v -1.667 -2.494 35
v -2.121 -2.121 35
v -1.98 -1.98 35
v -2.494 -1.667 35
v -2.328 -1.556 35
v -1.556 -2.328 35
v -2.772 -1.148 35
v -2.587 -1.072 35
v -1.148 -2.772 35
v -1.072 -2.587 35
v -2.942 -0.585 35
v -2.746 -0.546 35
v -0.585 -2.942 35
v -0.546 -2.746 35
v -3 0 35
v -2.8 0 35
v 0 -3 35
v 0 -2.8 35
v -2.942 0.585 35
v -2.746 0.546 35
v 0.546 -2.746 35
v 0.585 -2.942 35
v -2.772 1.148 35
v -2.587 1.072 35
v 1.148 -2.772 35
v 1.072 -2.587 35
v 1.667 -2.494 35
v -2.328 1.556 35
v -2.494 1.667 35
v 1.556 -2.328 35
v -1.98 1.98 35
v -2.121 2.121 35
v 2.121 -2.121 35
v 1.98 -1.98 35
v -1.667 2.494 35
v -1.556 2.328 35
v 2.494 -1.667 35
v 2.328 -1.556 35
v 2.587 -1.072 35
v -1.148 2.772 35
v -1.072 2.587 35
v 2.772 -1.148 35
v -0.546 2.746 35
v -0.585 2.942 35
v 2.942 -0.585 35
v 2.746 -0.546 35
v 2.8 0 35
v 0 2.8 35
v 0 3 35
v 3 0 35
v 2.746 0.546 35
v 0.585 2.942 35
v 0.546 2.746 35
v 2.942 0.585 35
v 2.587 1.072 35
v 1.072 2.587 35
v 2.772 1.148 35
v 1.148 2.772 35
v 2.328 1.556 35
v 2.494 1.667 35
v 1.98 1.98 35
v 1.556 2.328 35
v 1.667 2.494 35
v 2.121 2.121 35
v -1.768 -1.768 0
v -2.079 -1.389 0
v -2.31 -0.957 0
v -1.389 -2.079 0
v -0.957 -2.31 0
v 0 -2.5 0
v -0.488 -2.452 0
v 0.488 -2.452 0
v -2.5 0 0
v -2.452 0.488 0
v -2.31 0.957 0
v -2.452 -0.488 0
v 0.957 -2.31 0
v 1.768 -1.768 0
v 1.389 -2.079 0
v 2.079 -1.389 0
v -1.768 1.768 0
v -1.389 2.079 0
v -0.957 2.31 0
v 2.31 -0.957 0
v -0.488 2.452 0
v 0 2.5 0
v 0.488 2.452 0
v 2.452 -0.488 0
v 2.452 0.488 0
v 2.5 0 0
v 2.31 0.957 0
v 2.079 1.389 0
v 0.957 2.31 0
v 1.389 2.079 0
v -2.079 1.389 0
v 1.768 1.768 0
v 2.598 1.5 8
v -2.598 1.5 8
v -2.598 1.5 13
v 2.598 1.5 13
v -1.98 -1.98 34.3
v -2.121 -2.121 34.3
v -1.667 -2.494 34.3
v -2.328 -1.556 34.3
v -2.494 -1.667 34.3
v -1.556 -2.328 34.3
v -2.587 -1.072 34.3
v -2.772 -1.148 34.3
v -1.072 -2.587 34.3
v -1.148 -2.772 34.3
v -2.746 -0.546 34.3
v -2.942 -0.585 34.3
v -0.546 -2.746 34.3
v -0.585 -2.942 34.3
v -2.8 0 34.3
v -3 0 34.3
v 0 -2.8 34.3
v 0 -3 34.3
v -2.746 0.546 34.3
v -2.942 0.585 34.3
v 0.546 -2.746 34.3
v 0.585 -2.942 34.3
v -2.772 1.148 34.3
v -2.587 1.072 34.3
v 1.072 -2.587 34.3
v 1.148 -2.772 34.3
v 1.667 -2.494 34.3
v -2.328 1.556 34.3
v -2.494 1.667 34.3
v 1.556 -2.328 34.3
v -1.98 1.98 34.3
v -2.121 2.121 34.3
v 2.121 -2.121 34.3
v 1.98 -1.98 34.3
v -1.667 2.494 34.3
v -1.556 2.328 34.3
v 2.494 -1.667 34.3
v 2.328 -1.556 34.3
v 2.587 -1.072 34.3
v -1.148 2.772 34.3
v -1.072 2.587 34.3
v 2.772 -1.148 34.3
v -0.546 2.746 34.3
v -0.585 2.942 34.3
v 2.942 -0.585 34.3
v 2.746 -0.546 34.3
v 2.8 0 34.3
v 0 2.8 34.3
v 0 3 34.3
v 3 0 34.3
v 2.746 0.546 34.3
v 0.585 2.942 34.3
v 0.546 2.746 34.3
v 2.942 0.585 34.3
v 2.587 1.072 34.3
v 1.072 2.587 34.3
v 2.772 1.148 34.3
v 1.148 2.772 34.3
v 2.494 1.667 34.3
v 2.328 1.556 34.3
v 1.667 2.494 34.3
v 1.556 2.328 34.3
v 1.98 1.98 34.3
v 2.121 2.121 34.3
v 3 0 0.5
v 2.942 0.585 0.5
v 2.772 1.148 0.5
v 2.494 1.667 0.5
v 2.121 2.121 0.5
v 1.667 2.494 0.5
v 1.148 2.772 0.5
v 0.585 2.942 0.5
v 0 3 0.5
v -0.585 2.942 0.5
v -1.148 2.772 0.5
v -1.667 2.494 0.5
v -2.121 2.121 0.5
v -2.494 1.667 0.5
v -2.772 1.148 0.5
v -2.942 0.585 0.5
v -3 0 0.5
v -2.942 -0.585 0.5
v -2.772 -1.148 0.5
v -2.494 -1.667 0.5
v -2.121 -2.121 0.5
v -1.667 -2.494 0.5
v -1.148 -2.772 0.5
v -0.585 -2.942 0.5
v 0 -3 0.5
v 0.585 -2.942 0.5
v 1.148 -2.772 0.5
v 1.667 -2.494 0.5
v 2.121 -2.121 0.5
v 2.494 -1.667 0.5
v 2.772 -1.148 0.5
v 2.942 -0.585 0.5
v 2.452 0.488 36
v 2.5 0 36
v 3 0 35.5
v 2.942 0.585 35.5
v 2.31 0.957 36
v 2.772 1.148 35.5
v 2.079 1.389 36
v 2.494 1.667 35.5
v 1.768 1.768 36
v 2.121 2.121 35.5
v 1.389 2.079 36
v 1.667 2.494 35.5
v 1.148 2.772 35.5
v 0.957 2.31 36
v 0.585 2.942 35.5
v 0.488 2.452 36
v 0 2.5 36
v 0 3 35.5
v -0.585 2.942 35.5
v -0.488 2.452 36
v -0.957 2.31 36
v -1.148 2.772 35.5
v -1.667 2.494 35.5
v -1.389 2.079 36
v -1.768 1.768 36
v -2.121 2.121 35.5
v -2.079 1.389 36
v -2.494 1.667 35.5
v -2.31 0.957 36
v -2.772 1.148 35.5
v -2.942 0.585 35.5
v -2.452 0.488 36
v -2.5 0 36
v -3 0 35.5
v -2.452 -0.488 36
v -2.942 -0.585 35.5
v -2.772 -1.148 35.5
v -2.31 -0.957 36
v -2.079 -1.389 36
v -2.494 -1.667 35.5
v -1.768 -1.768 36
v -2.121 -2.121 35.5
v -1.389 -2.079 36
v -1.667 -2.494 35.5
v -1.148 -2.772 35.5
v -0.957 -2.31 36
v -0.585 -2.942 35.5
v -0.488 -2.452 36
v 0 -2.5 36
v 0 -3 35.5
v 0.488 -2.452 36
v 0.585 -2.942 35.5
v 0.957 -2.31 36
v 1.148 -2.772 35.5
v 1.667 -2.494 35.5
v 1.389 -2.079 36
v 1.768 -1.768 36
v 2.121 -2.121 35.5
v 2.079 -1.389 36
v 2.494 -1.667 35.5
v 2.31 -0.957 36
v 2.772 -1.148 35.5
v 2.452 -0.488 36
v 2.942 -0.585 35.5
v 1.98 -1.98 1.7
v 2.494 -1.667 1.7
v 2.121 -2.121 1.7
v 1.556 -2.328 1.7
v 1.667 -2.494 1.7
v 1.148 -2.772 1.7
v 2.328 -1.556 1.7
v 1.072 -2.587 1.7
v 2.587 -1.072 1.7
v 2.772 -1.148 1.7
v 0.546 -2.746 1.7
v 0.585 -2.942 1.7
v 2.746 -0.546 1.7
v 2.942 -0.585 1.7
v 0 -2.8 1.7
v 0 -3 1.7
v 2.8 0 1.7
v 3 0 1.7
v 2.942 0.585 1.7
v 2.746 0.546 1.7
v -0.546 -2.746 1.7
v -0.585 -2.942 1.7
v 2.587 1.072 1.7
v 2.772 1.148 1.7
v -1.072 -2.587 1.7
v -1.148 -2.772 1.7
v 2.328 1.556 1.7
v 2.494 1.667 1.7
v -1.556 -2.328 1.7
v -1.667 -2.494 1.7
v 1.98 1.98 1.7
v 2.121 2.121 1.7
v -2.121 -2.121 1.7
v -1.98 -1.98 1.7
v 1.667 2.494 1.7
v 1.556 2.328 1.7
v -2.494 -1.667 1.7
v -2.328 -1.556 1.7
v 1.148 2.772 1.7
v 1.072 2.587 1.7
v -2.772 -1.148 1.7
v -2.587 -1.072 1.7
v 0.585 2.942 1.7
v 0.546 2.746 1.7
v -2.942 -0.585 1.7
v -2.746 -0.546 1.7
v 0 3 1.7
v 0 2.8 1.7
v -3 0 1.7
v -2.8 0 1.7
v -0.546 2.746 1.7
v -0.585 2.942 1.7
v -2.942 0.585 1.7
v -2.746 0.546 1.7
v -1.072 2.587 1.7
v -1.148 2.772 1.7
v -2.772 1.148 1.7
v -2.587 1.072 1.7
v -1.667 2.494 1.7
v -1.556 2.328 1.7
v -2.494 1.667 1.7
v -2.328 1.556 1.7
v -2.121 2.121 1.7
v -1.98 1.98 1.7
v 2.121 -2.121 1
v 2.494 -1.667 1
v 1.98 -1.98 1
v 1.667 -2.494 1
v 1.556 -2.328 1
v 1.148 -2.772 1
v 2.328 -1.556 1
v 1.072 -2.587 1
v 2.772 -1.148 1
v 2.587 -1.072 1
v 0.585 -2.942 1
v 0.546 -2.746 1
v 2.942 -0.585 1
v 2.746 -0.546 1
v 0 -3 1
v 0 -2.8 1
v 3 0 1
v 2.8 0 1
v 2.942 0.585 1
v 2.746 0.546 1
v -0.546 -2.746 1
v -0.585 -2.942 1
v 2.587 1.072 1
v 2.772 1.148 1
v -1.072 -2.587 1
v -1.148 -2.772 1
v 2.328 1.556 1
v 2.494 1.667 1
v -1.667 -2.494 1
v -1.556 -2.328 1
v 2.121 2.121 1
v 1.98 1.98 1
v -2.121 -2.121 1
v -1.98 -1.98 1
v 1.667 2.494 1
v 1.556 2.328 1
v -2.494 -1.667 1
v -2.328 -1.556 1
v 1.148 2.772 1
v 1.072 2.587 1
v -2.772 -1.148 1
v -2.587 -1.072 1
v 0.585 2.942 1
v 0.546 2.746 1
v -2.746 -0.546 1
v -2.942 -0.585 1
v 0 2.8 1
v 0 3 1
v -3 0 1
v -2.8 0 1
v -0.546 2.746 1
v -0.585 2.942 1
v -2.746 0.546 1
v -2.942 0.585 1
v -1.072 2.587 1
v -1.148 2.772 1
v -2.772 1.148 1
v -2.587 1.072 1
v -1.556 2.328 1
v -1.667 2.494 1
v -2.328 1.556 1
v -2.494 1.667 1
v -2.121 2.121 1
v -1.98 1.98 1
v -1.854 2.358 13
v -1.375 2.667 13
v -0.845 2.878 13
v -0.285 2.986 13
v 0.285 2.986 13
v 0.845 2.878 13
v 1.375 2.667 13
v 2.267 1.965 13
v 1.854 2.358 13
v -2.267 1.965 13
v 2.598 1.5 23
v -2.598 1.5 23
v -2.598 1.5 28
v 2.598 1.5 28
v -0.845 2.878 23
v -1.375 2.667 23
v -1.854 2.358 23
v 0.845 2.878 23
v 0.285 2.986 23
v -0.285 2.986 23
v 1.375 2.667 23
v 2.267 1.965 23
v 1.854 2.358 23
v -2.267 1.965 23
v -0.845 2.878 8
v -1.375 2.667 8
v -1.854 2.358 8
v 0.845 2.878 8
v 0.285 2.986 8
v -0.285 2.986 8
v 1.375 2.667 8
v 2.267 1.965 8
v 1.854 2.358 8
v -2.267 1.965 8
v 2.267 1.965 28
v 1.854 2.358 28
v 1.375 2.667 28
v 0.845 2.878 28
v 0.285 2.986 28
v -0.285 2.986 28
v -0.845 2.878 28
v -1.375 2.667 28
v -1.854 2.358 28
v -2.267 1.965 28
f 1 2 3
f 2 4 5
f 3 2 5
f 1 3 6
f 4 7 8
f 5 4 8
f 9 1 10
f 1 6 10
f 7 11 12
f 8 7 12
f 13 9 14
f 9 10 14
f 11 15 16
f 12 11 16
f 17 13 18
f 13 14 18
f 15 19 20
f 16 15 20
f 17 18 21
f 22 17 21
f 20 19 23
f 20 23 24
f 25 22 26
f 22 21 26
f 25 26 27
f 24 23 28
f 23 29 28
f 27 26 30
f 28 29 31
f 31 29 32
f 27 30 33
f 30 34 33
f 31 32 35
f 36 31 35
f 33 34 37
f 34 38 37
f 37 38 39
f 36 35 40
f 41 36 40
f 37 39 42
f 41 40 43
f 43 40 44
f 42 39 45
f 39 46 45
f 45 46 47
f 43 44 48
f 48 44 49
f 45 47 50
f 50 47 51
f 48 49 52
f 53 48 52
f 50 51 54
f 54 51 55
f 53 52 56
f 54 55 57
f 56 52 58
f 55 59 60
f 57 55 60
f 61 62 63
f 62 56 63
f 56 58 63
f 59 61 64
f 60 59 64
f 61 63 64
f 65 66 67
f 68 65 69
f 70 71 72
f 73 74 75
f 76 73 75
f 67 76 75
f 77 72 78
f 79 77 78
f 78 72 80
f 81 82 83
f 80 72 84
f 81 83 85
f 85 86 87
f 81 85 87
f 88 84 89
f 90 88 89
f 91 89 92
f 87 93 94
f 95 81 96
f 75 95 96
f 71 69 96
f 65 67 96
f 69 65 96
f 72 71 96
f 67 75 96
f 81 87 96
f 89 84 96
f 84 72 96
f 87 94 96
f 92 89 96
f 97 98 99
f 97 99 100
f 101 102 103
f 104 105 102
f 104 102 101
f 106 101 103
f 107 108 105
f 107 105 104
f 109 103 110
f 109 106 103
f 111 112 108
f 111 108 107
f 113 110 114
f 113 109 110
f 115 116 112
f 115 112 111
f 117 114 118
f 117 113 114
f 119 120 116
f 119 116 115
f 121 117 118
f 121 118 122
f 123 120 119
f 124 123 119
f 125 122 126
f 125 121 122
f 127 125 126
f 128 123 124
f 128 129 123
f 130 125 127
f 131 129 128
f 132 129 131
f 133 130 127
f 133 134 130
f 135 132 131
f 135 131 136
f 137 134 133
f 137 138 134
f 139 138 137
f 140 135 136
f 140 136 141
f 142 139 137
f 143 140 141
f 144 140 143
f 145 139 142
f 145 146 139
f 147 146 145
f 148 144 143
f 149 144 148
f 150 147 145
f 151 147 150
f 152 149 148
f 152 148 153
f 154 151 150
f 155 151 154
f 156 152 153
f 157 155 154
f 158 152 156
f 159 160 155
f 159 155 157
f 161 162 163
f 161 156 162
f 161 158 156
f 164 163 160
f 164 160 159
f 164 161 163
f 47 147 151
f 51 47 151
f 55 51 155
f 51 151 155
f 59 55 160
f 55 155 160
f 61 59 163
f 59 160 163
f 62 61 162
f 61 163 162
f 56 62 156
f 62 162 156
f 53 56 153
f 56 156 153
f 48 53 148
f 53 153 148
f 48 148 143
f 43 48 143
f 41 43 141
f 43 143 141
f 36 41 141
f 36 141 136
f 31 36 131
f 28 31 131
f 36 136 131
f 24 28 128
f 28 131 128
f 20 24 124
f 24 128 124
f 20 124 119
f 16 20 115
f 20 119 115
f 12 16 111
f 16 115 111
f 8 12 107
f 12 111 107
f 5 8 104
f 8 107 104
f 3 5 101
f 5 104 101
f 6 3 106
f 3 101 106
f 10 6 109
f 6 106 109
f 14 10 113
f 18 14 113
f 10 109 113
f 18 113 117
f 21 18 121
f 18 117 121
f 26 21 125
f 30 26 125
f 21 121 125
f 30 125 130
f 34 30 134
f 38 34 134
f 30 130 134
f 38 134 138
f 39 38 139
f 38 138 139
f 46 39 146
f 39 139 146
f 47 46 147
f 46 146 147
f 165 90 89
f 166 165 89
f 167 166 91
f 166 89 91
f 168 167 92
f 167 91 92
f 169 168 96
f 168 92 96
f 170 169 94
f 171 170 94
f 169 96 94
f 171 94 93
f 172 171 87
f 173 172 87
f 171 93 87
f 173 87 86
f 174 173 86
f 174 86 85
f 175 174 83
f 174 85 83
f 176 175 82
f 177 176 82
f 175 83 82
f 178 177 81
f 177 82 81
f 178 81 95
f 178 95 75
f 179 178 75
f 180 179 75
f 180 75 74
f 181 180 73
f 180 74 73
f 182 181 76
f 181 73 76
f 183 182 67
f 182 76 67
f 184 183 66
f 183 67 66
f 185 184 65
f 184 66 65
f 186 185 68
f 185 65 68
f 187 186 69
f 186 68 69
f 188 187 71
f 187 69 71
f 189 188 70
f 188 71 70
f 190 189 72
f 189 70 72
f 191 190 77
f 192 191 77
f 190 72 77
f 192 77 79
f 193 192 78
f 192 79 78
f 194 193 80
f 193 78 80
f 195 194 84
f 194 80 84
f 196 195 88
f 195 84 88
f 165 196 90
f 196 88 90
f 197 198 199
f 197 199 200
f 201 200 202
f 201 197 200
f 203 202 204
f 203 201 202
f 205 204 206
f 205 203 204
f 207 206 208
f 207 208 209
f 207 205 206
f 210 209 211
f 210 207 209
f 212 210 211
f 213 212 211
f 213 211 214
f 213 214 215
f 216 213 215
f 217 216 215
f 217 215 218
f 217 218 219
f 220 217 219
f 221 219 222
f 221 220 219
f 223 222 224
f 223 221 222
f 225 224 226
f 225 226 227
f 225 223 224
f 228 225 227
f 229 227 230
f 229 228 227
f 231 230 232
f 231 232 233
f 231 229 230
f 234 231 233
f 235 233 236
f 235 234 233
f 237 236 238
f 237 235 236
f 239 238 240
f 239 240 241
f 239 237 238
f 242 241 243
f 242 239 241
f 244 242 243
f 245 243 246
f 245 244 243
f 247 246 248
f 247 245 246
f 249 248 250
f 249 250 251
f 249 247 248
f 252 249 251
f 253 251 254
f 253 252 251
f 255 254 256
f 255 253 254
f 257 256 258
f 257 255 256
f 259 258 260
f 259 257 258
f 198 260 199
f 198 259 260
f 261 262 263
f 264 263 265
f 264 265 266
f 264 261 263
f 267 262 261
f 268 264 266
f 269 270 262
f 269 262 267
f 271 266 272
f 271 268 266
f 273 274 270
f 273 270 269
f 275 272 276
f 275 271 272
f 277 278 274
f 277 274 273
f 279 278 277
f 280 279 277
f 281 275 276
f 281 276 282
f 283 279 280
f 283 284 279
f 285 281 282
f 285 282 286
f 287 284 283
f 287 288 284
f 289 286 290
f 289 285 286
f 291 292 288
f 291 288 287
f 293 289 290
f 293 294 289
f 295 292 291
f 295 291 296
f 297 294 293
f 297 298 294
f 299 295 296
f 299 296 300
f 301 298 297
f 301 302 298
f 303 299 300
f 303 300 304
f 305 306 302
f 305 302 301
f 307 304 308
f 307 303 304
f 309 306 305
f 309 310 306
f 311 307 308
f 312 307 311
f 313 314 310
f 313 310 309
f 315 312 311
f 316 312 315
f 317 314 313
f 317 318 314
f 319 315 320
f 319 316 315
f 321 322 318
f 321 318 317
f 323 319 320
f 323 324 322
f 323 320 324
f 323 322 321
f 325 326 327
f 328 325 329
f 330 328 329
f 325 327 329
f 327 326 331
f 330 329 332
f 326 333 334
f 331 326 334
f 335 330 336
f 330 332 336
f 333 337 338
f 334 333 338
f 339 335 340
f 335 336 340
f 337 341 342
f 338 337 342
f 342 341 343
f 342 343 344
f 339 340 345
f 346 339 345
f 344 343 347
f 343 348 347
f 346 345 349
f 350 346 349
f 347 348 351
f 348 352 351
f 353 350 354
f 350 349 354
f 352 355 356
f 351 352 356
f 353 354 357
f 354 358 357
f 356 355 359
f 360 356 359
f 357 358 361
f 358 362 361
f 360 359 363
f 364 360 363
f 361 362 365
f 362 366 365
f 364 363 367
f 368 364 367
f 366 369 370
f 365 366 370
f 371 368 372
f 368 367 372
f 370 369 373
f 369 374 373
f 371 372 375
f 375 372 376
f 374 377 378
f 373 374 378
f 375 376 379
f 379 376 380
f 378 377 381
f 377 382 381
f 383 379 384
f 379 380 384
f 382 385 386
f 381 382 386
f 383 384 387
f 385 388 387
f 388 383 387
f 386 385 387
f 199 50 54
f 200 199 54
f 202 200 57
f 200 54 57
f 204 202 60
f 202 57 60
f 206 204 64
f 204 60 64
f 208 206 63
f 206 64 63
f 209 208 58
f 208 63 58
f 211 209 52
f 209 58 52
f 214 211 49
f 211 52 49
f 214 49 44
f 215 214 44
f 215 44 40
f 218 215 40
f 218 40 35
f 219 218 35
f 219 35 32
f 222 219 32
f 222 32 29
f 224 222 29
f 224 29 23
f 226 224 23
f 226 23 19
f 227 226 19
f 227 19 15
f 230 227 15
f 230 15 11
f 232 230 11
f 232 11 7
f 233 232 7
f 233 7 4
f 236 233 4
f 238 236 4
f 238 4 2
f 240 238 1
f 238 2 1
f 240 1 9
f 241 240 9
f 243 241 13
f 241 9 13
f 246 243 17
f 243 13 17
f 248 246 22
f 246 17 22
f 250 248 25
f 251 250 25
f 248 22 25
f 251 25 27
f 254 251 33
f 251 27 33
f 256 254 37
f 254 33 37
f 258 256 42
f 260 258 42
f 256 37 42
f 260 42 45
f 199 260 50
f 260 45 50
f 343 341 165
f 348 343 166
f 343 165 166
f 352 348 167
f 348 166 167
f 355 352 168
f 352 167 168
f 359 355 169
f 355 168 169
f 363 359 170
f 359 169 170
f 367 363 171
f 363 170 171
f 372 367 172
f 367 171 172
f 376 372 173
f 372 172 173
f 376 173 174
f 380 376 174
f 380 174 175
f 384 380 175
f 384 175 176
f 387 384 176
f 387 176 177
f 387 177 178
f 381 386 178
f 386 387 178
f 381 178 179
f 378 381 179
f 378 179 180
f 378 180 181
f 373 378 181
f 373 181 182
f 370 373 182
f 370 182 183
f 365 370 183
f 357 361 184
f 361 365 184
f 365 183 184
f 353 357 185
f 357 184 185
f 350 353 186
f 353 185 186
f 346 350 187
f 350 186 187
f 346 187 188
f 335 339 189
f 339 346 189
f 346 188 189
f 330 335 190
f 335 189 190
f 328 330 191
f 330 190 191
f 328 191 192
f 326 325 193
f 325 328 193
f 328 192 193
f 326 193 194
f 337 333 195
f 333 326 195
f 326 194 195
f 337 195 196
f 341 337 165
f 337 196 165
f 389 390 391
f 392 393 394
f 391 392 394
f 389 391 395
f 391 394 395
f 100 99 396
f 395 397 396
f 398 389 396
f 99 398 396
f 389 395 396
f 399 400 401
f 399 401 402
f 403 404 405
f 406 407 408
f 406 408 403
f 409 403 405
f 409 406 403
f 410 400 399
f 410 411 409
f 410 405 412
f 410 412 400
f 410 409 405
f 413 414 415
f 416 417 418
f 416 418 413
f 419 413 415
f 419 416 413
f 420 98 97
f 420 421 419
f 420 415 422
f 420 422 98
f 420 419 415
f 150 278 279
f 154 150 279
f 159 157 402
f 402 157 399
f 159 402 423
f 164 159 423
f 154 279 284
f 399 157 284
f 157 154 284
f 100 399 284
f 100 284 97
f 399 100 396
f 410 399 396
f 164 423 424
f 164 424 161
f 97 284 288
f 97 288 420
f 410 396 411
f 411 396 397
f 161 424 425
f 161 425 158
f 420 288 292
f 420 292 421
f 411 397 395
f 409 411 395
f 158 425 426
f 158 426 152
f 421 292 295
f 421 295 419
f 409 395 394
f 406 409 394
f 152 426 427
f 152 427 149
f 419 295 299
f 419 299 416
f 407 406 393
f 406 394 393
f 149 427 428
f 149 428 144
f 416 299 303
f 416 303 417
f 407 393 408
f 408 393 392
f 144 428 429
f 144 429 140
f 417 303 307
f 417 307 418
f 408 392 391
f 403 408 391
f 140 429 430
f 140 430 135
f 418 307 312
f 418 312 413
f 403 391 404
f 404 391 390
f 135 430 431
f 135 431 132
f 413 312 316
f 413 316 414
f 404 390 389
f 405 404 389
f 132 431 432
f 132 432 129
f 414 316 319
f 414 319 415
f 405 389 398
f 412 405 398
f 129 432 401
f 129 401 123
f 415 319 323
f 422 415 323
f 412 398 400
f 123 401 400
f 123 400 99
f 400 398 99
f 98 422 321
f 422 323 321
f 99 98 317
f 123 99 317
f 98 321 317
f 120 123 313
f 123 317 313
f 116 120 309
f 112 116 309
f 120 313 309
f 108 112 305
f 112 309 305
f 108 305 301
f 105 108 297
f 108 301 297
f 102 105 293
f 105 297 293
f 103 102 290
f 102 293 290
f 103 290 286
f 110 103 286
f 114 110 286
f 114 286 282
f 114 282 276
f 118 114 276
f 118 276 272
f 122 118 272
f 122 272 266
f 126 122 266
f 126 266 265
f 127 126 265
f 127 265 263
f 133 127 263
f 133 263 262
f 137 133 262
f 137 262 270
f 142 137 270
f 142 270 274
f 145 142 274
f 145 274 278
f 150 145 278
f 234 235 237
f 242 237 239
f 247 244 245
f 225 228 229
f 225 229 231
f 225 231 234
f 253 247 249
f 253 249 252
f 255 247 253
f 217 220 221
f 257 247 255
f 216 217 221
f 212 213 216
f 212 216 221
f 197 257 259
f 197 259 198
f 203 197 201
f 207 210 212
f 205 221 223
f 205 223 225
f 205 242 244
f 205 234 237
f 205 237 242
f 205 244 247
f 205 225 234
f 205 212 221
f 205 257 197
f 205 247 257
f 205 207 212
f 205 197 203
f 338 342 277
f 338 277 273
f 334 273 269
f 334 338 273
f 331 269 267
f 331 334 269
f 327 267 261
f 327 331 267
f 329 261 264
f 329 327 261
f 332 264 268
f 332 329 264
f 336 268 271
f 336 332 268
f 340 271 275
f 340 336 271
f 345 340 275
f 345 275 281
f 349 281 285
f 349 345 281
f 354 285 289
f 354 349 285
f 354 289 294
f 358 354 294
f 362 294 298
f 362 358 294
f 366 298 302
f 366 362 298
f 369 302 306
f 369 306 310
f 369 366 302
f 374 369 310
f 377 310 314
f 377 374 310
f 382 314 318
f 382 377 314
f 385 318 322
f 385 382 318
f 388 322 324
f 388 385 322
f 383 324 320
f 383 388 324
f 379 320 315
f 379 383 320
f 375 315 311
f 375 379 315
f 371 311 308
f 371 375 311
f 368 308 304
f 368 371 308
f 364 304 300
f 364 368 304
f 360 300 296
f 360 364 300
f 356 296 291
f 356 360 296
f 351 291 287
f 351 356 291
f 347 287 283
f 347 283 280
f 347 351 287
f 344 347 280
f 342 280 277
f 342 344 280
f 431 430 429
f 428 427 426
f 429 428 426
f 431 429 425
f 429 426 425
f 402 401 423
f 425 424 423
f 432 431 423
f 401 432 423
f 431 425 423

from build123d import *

# Parameters (mm, degrees)
SZKIC1_R                    = 3
DODANIE_WYCI_GNI_CIE1_DEPTH = 36
SFAZOWANIE1_SIZE            = 0.5
WYTNIJ_WYCI_GNI_CIE1_START  = -1.7
SZKIC2_R                    = 3
SZKIC2_R_2                  = 2.8
WYTNIJ_WYCI_GNI_CIE1_DEPTH  = 0.7
WYTNIJ_WYCI_GNI_CIE2_START  = -1
SZKIC3_R                    = 3
SZKIC3_R_2                  = 2.8
WYTNIJ_WYCI_GNI_CIE2_DEPTH  = 0.7
WYTNIJ_WYCI_GNI_CIE3_START  = -13
WYTNIJ_WYCI_GNI_CIE3_DEPTH  = 5
WYTNIJ_WYCI_GNI_CIE4_START  = -28
WYTNIJ_WYCI_GNI_CIE4_DEPTH  = 5


with BuildPart() as part:
    # Szkic1 → Dodanie-wyciągnięcie1 (new body)
    with BuildSketch(Plane.XY):
        Circle(SZKIC1_R)
    extrude(amount=DODANIE_WYCI_GNI_CIE1_DEPTH)

    # Sfazowanie1
    sfazowanie1_edges = [part.edges().sort_by_distance(p)[0] for p in [
        (-3, 0, 0),
        (-3, 0, 36),
    ]]
    chamfer(sfazowanie1_edges, length=SFAZOWANIE1_SIZE)

    # Szkic2 → Wytnij-wyciągnięcie1 (cut)
    with BuildSketch(Plane.XY.offset(36).offset(WYTNIJ_WYCI_GNI_CIE1_START)):
        Circle(SZKIC2_R)
        Circle(SZKIC2_R_2, mode=Mode.SUBTRACT)
    extrude(amount=WYTNIJ_WYCI_GNI_CIE1_DEPTH, mode=Mode.SUBTRACT)

    # Szkic3 → Wytnij-wyciągnięcie2 (cut)
    with BuildSketch(Plane(origin=(0, 0, 0), x_dir=(-1, 0, 0), z_dir=(0, 0, -1)).offset(WYTNIJ_WYCI_GNI_CIE2_START)):
        Circle(SZKIC3_R)
        Circle(SZKIC3_R_2, mode=Mode.SUBTRACT)
    extrude(amount=-WYTNIJ_WYCI_GNI_CIE2_DEPTH, mode=Mode.SUBTRACT)

    # Szkic4 → Wytnij-wyciągnięcie3 (cut)
    with BuildSketch(Plane.XY.offset(36).offset(WYTNIJ_WYCI_GNI_CIE3_START)):
        with BuildLine():
            Line((-2.598076211, 1.5), (2.598076211, 1.5))
            ThreePointArc((2.598076211, 1.5), (0, 3), (-2.598076211, 1.5))
        make_face()
    extrude(amount=WYTNIJ_WYCI_GNI_CIE3_DEPTH, mode=Mode.SUBTRACT)

    # Szkic4<2> → Wytnij-wyciągnięcie4 (cut)
    with BuildSketch(Plane.XY.offset(36).offset(WYTNIJ_WYCI_GNI_CIE4_START)):
        with BuildLine():
            Line((-2.598076211, 1.5), (2.598076211, 1.5))
            ThreePointArc((2.598076211, 1.5), (0, 3), (-2.598076211, 1.5))
        make_face()
    extrude(amount=WYTNIJ_WYCI_GNI_CIE4_DEPTH, mode=Mode.SUBTRACT)


solid = part.part
